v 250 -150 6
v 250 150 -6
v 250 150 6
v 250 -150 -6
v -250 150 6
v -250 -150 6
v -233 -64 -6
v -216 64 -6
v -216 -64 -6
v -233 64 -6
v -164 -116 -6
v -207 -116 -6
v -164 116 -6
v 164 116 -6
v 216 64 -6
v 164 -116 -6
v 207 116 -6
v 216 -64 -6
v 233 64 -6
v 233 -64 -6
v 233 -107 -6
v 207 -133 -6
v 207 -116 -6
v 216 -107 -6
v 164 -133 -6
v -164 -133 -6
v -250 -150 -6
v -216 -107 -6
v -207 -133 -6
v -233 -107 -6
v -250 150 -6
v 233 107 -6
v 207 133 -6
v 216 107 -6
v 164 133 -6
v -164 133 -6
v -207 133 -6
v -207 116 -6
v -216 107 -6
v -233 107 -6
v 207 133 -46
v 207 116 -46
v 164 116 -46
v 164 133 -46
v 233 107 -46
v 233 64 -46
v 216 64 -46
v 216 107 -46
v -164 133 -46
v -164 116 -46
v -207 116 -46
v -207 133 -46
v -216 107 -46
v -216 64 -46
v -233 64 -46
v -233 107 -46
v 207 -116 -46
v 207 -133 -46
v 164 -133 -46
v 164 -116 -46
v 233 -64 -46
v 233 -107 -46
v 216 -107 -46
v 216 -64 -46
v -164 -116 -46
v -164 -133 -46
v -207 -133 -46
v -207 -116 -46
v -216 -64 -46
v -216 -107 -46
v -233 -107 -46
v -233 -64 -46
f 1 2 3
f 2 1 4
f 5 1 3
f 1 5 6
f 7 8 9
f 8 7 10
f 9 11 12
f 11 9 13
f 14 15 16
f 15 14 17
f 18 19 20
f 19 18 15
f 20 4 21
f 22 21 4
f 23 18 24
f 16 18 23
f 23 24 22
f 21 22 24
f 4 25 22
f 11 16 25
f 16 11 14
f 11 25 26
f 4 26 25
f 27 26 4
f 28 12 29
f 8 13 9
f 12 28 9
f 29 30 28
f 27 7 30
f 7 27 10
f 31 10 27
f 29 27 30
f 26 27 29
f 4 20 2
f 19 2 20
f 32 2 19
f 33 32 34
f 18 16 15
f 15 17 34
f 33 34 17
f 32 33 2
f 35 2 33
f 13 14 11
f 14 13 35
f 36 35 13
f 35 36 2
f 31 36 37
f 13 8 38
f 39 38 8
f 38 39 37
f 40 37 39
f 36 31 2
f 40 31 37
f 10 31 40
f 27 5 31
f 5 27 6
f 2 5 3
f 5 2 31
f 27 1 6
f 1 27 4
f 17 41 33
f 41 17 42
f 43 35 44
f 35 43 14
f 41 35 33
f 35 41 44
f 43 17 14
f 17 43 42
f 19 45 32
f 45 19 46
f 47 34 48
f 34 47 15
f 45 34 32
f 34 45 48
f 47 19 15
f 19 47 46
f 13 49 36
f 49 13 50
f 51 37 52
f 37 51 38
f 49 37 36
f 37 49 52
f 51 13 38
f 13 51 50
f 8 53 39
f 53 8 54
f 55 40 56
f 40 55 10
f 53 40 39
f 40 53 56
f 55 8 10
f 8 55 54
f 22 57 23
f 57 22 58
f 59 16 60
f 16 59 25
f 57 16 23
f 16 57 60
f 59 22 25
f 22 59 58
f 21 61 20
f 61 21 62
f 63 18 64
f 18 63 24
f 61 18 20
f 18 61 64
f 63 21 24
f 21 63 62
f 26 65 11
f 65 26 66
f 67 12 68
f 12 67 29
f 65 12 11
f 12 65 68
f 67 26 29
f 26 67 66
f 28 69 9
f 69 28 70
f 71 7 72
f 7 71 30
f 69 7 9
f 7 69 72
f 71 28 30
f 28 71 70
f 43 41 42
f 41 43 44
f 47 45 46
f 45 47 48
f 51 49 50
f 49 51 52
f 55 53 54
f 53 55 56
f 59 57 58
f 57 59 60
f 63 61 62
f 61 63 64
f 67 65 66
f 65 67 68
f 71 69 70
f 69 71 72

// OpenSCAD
module top(table_width,table_depth,shelf_thickness,strut_timber_width,strut_timber_depth,leg_timber_width, lap_depth,brace_length)
{
    difference()
    {
      cube([table_width,table_depth,shelf_thickness],true);
    	
    	//Back Right - x-parallel
    	translate([table_width/2 - brace_length/2 - leg_timber_width,
    						table_depth/2 - strut_timber_depth/2 - strut_timber_depth,
    						-shelf_thickness/2 + shelf_thickness/4/2])
    	{
				cube([brace_length,strut_timber_depth,shelf_thickness/4],true);
			}
			
			//Back right y-parallel
		  translate([table_width/2 - strut_timber_depth/2 - strut_timber_depth,
    						table_depth/2 - brace_length/2 - leg_timber_width,
    						-shelf_thickness/2 + shelf_thickness/4/2])
    	{
				cube([strut_timber_depth,brace_length,shelf_thickness/4],true);
			}
			
			
			//Back Left - x-parallel
    	translate([(table_width/2 - brace_length/2 - leg_timber_width)*-1,
    						table_depth/2 - strut_timber_depth/2 - strut_timber_depth,
    						-shelf_thickness/2 + shelf_thickness/4/2])
    	{
				cube([brace_length,strut_timber_depth,shelf_thickness/4],true);
			}
			
			//Back Left y-parallel
		  translate([(table_width/2 - strut_timber_depth/2 - strut_timber_depth)*-1,
    						table_depth/2 - brace_length/2 - leg_timber_width,
    						-shelf_thickness/2 + shelf_thickness/4/2])
    	{
				cube([strut_timber_depth,brace_length,shelf_thickness/4],true);
			}
			
			
			//Front Right - x-parallel
    	translate([table_width/2 - brace_length/2 - leg_timber_width,
    						(table_depth/2 - strut_timber_depth/2 - strut_timber_depth)*-1,
    						-shelf_thickness/2 + shelf_thickness/4/2])
    	{
				cube([brace_length,strut_timber_depth,shelf_thickness/4],true);
			}
			
			//Back right y-parallel
		  translate([table_width/2 - strut_timber_depth/2 - strut_timber_depth,
    						(table_depth/2 - brace_length/2 - leg_timber_width)*-1,
    						-shelf_thickness/2 + shelf_thickness/4/2])
    	{
				cube([strut_timber_depth,brace_length,shelf_thickness/4],true);
			}
			
			
			//Front Left - x-parallel
    	translate([(table_width/2 - brace_length/2 - leg_timber_width)*-1,
    						(table_depth/2 - strut_timber_depth/2 - strut_timber_depth)*-1,
    						-shelf_thickness/2 + shelf_thickness/4/2])
    	{
				cube([brace_length,strut_timber_depth,shelf_thickness/4],true);
			}
			
			//Front Left y-parallel
		  translate([(table_width/2 - strut_timber_depth/2 - strut_timber_depth)*-1,
    						(table_depth/2 - brace_length/2 - leg_timber_width)*-1,
    						-shelf_thickness/2 + shelf_thickness/4/2])
    	{
				cube([strut_timber_depth,brace_length,shelf_thickness/4],true);
			}

		}
		
		//Back Right x-parallel
		translate([table_width/2 - brace_length/2 - leg_timber_width,
    						table_depth/2 - strut_timber_depth/2 - strut_timber_depth,
    						-strut_timber_width/2-shelf_thickness/4])
    {
			cube([brace_length,strut_timber_depth,strut_timber_width],true);
		}
		
		// Back right y-parallel
		translate([table_width/2 - strut_timber_depth/2 - strut_timber_depth,
    						table_depth/2 - brace_length/2 - leg_timber_width,
    						-strut_timber_width/2-shelf_thickness/4])
    {
			cube([strut_timber_depth,brace_length,strut_timber_width],true);
		}
		
		//Back Left x-parallel
		translate([(table_width/2 - brace_length/2 - leg_timber_width)*-1,
    						table_depth/2 - strut_timber_depth/2 - strut_timber_depth,
    						-strut_timber_width/2-shelf_thickness/4])
    {
			cube([brace_length,strut_timber_depth,strut_timber_width],true);
		}
		
		// Back Left y-parallel
		translate([(table_width/2 - strut_timber_depth/2 - strut_timber_depth)*-1,
    						table_depth/2 - brace_length/2 - leg_timber_width,
    						-strut_timber_width/2-shelf_thickness/4])
    {
			cube([strut_timber_depth,brace_length,strut_timber_width],true);
		}
		
		
		//Front Right x-parallel
		translate([table_width/2 - brace_length/2 - leg_timber_width,
    						(table_depth/2 - strut_timber_depth/2 - strut_timber_depth)*-1,
    						-strut_timber_width/2-shelf_thickness/4])
    {
			cube([brace_length,strut_timber_depth,strut_timber_width],true);
		}
		
		// Front right y-parallel
		translate([table_width/2 - strut_timber_depth/2 - strut_timber_depth,
    						(table_depth/2 - brace_length/2 - leg_timber_width)*-1,
    						-strut_timber_width/2-shelf_thickness/4])
    {
			cube([strut_timber_depth,brace_length,strut_timber_width],true);
		}
		
		//Front Left x-parallel
		translate([(table_width/2 - brace_length/2 - leg_timber_width)*-1,
    						(table_depth/2 - strut_timber_depth/2 - strut_timber_depth)*-1,
    						-strut_timber_width/2-shelf_thickness/4])
    {
			cube([brace_length,strut_timber_depth,strut_timber_width],true);
		}
		
		//Front Left y-parallel
		translate([(table_width/2 - strut_timber_depth/2 - strut_timber_depth)*-1,
    						(table_depth/2 - brace_length/2 - leg_timber_width)*-1,
    						-strut_timber_width/2-shelf_thickness/4])
    {
			cube([strut_timber_depth,brace_length,strut_timber_width],true);
		}
}
top(500,300,12,43,17,43,15,43);
